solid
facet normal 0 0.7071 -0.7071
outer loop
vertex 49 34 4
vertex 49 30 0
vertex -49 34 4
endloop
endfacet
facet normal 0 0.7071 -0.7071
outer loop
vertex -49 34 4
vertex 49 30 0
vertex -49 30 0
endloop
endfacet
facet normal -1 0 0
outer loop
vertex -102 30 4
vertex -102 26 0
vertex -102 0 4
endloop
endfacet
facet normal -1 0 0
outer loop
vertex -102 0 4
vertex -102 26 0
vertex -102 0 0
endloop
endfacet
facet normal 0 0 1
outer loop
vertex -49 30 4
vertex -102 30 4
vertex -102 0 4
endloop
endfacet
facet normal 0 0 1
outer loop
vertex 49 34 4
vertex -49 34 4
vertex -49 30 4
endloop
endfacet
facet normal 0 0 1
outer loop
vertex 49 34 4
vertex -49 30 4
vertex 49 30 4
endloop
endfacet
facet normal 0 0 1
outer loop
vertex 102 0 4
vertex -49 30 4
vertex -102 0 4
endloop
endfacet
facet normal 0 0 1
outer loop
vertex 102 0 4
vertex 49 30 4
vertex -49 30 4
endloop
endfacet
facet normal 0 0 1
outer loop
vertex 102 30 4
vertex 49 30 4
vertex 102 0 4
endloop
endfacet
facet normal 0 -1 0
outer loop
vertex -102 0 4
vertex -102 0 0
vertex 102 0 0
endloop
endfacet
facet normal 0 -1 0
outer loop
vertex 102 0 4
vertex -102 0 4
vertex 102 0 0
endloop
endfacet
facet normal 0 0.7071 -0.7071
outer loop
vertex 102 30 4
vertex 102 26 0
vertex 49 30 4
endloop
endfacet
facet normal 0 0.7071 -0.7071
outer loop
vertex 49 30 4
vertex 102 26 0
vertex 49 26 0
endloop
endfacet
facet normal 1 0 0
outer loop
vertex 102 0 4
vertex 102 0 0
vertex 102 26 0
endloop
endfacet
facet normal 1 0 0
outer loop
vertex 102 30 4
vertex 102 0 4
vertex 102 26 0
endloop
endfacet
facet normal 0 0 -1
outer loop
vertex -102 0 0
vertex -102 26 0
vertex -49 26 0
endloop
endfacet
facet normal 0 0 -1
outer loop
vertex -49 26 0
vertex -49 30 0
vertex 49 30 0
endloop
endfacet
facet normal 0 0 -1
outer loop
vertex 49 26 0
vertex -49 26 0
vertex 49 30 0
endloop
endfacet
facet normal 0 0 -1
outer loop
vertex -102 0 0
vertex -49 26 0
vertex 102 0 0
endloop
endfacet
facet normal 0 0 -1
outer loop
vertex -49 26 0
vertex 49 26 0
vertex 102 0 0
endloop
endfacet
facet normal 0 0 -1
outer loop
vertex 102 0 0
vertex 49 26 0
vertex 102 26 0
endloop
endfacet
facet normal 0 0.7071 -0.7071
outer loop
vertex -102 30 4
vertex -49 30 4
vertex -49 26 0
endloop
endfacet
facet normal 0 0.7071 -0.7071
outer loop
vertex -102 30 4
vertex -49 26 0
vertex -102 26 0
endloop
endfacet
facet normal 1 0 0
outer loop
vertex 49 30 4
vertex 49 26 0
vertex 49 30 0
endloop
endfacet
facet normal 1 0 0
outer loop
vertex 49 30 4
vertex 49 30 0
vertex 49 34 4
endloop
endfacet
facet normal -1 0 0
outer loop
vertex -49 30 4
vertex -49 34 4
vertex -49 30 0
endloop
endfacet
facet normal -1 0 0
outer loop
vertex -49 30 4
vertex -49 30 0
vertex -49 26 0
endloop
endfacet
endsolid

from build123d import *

# Parameters (mm, degrees)
F1_DEPTH = 4
F2_SIZE  = 3.99999
F3_SIZE  = 3.99999
F4_SIZE  = 3.99999


# Not quite as in the source:
# - a fillet or chamfer is up to 0.001 mm smaller than in the source, because OpenCascade refuses the exact size


with BuildPart() as f1:
    # F0 (on Top) → F1 (new body)
    with BuildSketch(Plane.XY):
        Polygon((-102, 0), (0, 0), (102, 0), (102, 30), (49, 30), (49, 34), (-49, 34), (-49, 30), (-102, 30), align=None)
    extrude(amount=F1_DEPTH)

    # F2 (size 4 in the source; OpenCascade refuses exactly that, so slightly less here)
    f2_edges = [f1.edges().sort_by_distance(p)[0] for p in [
        (75.5, 30, 0),
    ]]
    chamfer(f2_edges, length=F2_SIZE)

    # F3 (size 4 in the source; OpenCascade refuses exactly that, so slightly less here)
    f3_edges = [f1.edges().sort_by_distance(p)[0] for p in [
        (0, 34, 0),
    ]]
    chamfer(f3_edges, length=F3_SIZE)

    # F4 (size 4 in the source; OpenCascade refuses exactly that, so slightly less here)
    f4_edges = [f1.edges().sort_by_distance(p)[0] for p in [
        (-75.5, 30, 0),
    ]]
    chamfer(f4_edges, length=F4_SIZE)


solid = f1.part
